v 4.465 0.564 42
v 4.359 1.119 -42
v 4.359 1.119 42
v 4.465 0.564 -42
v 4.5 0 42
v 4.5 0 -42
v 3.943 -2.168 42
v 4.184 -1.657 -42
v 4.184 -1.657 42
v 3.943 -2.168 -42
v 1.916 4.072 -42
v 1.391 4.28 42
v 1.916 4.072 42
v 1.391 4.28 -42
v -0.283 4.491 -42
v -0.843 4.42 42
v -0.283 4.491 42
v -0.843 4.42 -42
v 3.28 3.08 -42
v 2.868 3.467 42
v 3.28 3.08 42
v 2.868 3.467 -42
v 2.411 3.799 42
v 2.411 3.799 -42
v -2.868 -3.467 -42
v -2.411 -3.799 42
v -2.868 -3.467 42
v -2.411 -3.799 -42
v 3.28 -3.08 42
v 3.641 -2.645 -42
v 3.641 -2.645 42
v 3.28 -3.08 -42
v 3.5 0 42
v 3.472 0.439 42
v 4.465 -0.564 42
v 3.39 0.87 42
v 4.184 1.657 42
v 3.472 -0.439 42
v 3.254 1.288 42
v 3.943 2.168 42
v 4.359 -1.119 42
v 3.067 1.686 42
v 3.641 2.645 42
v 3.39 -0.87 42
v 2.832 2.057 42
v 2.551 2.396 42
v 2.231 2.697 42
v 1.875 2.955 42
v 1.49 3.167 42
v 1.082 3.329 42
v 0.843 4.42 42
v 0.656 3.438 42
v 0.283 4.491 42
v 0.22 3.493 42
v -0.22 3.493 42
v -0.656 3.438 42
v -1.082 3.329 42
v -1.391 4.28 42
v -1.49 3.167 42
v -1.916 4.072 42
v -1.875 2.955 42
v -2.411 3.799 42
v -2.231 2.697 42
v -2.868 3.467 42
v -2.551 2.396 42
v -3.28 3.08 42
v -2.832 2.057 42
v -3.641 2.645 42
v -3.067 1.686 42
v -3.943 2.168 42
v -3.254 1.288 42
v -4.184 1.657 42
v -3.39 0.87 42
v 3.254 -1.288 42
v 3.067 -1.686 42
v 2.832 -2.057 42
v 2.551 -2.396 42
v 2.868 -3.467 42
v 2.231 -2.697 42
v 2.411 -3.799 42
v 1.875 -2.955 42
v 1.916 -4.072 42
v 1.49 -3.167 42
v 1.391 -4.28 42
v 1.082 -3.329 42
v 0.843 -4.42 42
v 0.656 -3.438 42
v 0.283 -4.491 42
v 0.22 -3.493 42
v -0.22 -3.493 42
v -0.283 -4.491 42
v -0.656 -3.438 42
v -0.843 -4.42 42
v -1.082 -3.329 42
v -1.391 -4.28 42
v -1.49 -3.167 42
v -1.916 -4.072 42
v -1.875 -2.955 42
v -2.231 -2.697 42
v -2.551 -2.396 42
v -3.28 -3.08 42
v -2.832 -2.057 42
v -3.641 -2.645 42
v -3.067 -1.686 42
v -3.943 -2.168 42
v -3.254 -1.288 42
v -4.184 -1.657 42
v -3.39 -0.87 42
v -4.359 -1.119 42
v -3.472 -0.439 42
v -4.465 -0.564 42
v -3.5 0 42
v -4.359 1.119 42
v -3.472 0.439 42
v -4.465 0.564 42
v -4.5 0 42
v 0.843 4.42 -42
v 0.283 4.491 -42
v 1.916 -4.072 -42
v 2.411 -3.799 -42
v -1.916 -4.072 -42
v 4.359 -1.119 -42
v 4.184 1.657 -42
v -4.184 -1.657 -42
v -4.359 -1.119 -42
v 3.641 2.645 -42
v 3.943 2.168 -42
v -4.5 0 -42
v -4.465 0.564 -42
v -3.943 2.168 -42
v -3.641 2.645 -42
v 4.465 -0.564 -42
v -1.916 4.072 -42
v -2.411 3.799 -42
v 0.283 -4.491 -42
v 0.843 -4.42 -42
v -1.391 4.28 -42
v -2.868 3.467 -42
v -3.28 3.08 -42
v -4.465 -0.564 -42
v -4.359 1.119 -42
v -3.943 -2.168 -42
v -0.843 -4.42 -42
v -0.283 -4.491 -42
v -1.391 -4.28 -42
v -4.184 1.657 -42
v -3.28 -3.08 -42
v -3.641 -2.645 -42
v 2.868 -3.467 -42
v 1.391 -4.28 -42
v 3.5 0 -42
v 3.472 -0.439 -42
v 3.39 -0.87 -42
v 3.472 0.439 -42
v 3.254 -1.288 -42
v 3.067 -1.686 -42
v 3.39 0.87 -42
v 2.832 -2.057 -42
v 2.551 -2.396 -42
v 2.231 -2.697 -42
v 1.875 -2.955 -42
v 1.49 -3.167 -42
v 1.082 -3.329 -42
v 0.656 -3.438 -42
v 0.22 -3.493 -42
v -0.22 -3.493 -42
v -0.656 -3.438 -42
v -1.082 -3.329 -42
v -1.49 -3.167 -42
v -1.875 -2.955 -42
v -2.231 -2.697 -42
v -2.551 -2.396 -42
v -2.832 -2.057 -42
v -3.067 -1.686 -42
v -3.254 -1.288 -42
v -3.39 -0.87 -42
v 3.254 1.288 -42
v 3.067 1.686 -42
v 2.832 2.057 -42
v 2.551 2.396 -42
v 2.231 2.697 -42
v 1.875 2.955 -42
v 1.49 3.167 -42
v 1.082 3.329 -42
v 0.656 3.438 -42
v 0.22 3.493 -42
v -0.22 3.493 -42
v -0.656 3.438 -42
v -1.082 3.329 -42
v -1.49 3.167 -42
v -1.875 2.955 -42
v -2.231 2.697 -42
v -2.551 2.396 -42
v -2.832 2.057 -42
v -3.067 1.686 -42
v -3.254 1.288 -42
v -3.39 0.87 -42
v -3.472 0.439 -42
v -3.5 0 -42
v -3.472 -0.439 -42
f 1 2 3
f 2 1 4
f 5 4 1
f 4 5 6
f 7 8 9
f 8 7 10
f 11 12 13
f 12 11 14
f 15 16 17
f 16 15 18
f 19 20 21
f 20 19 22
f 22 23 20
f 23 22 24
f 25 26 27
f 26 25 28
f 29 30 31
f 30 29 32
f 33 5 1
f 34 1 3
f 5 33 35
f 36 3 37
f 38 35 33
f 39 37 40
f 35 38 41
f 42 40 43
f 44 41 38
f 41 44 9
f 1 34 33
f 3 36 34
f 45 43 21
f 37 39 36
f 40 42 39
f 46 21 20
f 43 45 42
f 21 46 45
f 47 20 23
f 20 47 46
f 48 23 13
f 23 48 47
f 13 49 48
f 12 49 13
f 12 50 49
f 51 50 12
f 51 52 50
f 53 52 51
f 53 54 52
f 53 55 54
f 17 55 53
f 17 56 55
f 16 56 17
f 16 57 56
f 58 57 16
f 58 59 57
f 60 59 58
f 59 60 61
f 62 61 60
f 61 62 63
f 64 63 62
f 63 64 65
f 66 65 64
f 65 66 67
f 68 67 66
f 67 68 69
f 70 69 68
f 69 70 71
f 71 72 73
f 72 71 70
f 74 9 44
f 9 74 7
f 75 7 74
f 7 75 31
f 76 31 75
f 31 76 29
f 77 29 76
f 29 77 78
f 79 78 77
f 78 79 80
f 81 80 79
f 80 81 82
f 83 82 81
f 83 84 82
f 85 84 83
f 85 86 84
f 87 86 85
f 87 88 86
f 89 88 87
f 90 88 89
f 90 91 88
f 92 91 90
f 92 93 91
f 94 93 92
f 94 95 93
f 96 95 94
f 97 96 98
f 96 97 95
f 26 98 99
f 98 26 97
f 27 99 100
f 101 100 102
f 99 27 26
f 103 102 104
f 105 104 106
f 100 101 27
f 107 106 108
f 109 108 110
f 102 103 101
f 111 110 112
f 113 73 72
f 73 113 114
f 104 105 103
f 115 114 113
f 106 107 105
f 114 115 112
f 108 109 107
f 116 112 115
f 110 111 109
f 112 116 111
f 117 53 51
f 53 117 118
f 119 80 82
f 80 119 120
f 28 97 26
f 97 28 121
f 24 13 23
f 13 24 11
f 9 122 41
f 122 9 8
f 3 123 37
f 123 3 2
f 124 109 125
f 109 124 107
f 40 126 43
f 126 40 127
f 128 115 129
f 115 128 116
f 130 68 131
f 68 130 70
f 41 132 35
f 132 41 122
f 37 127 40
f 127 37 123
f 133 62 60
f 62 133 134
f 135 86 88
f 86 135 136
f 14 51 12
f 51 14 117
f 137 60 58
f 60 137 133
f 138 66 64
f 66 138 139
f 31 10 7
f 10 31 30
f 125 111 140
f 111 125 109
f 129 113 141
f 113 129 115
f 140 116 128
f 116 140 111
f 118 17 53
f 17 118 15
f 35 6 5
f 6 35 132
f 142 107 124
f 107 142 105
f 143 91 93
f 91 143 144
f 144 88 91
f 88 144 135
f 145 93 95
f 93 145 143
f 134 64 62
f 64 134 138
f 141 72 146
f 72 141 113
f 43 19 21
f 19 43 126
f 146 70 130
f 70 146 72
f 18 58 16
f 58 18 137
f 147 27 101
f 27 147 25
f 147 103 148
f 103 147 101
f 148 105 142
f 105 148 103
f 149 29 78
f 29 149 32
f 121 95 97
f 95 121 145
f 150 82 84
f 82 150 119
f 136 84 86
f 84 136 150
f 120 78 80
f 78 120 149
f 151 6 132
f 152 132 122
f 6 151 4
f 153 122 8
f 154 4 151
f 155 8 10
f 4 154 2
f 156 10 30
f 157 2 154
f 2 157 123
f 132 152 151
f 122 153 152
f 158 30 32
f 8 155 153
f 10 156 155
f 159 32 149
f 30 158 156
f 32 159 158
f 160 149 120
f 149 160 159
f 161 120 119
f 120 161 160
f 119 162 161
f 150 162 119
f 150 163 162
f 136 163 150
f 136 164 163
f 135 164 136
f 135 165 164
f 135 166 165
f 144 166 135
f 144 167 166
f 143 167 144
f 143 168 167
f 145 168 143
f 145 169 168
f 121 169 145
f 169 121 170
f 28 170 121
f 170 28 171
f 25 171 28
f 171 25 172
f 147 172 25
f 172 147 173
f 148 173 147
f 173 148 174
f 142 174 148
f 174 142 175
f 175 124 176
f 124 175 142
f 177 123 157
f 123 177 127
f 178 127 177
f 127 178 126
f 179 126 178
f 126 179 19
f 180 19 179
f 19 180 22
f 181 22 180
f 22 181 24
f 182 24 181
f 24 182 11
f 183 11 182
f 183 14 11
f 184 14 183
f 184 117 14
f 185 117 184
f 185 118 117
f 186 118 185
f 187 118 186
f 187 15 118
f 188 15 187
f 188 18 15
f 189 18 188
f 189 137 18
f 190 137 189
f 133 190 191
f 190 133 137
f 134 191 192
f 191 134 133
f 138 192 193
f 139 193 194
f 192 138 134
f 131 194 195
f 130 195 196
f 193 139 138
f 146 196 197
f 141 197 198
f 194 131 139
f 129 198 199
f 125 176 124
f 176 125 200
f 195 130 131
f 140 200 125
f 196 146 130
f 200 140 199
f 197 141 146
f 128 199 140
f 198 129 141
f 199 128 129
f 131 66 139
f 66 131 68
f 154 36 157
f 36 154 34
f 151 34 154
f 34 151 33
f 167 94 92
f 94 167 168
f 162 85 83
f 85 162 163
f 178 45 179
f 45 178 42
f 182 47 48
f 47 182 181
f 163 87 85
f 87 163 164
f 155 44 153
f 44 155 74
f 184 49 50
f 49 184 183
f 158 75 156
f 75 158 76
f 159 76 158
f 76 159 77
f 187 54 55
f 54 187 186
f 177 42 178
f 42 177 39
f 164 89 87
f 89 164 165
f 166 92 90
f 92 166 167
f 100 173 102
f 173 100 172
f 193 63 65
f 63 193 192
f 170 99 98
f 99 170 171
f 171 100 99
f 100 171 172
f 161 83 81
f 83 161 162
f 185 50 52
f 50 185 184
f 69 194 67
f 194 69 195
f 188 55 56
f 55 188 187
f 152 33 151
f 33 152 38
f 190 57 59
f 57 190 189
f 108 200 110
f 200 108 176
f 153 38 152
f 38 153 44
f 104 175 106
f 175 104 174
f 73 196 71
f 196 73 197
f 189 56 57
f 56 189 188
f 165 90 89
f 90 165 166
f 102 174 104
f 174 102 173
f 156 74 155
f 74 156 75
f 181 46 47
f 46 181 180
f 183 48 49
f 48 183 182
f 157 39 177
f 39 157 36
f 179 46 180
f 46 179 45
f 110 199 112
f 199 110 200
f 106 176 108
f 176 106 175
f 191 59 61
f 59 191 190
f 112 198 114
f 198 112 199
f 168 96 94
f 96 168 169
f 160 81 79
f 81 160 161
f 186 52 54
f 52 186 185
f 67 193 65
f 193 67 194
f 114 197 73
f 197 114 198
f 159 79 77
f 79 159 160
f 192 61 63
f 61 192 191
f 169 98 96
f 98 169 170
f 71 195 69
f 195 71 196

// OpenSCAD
$fn = 50;


difference() {
	union() {
		translate(v = [0, 0, -42.0000000000]) {
			cylinder(h = 84, r = 4.5000000000);
		}
	}
	union() {
		translate(v = [0, 0, -100.0000000000]) {
			cylinder(h = 200, r = 3.5000000000);
		}
	}
}
